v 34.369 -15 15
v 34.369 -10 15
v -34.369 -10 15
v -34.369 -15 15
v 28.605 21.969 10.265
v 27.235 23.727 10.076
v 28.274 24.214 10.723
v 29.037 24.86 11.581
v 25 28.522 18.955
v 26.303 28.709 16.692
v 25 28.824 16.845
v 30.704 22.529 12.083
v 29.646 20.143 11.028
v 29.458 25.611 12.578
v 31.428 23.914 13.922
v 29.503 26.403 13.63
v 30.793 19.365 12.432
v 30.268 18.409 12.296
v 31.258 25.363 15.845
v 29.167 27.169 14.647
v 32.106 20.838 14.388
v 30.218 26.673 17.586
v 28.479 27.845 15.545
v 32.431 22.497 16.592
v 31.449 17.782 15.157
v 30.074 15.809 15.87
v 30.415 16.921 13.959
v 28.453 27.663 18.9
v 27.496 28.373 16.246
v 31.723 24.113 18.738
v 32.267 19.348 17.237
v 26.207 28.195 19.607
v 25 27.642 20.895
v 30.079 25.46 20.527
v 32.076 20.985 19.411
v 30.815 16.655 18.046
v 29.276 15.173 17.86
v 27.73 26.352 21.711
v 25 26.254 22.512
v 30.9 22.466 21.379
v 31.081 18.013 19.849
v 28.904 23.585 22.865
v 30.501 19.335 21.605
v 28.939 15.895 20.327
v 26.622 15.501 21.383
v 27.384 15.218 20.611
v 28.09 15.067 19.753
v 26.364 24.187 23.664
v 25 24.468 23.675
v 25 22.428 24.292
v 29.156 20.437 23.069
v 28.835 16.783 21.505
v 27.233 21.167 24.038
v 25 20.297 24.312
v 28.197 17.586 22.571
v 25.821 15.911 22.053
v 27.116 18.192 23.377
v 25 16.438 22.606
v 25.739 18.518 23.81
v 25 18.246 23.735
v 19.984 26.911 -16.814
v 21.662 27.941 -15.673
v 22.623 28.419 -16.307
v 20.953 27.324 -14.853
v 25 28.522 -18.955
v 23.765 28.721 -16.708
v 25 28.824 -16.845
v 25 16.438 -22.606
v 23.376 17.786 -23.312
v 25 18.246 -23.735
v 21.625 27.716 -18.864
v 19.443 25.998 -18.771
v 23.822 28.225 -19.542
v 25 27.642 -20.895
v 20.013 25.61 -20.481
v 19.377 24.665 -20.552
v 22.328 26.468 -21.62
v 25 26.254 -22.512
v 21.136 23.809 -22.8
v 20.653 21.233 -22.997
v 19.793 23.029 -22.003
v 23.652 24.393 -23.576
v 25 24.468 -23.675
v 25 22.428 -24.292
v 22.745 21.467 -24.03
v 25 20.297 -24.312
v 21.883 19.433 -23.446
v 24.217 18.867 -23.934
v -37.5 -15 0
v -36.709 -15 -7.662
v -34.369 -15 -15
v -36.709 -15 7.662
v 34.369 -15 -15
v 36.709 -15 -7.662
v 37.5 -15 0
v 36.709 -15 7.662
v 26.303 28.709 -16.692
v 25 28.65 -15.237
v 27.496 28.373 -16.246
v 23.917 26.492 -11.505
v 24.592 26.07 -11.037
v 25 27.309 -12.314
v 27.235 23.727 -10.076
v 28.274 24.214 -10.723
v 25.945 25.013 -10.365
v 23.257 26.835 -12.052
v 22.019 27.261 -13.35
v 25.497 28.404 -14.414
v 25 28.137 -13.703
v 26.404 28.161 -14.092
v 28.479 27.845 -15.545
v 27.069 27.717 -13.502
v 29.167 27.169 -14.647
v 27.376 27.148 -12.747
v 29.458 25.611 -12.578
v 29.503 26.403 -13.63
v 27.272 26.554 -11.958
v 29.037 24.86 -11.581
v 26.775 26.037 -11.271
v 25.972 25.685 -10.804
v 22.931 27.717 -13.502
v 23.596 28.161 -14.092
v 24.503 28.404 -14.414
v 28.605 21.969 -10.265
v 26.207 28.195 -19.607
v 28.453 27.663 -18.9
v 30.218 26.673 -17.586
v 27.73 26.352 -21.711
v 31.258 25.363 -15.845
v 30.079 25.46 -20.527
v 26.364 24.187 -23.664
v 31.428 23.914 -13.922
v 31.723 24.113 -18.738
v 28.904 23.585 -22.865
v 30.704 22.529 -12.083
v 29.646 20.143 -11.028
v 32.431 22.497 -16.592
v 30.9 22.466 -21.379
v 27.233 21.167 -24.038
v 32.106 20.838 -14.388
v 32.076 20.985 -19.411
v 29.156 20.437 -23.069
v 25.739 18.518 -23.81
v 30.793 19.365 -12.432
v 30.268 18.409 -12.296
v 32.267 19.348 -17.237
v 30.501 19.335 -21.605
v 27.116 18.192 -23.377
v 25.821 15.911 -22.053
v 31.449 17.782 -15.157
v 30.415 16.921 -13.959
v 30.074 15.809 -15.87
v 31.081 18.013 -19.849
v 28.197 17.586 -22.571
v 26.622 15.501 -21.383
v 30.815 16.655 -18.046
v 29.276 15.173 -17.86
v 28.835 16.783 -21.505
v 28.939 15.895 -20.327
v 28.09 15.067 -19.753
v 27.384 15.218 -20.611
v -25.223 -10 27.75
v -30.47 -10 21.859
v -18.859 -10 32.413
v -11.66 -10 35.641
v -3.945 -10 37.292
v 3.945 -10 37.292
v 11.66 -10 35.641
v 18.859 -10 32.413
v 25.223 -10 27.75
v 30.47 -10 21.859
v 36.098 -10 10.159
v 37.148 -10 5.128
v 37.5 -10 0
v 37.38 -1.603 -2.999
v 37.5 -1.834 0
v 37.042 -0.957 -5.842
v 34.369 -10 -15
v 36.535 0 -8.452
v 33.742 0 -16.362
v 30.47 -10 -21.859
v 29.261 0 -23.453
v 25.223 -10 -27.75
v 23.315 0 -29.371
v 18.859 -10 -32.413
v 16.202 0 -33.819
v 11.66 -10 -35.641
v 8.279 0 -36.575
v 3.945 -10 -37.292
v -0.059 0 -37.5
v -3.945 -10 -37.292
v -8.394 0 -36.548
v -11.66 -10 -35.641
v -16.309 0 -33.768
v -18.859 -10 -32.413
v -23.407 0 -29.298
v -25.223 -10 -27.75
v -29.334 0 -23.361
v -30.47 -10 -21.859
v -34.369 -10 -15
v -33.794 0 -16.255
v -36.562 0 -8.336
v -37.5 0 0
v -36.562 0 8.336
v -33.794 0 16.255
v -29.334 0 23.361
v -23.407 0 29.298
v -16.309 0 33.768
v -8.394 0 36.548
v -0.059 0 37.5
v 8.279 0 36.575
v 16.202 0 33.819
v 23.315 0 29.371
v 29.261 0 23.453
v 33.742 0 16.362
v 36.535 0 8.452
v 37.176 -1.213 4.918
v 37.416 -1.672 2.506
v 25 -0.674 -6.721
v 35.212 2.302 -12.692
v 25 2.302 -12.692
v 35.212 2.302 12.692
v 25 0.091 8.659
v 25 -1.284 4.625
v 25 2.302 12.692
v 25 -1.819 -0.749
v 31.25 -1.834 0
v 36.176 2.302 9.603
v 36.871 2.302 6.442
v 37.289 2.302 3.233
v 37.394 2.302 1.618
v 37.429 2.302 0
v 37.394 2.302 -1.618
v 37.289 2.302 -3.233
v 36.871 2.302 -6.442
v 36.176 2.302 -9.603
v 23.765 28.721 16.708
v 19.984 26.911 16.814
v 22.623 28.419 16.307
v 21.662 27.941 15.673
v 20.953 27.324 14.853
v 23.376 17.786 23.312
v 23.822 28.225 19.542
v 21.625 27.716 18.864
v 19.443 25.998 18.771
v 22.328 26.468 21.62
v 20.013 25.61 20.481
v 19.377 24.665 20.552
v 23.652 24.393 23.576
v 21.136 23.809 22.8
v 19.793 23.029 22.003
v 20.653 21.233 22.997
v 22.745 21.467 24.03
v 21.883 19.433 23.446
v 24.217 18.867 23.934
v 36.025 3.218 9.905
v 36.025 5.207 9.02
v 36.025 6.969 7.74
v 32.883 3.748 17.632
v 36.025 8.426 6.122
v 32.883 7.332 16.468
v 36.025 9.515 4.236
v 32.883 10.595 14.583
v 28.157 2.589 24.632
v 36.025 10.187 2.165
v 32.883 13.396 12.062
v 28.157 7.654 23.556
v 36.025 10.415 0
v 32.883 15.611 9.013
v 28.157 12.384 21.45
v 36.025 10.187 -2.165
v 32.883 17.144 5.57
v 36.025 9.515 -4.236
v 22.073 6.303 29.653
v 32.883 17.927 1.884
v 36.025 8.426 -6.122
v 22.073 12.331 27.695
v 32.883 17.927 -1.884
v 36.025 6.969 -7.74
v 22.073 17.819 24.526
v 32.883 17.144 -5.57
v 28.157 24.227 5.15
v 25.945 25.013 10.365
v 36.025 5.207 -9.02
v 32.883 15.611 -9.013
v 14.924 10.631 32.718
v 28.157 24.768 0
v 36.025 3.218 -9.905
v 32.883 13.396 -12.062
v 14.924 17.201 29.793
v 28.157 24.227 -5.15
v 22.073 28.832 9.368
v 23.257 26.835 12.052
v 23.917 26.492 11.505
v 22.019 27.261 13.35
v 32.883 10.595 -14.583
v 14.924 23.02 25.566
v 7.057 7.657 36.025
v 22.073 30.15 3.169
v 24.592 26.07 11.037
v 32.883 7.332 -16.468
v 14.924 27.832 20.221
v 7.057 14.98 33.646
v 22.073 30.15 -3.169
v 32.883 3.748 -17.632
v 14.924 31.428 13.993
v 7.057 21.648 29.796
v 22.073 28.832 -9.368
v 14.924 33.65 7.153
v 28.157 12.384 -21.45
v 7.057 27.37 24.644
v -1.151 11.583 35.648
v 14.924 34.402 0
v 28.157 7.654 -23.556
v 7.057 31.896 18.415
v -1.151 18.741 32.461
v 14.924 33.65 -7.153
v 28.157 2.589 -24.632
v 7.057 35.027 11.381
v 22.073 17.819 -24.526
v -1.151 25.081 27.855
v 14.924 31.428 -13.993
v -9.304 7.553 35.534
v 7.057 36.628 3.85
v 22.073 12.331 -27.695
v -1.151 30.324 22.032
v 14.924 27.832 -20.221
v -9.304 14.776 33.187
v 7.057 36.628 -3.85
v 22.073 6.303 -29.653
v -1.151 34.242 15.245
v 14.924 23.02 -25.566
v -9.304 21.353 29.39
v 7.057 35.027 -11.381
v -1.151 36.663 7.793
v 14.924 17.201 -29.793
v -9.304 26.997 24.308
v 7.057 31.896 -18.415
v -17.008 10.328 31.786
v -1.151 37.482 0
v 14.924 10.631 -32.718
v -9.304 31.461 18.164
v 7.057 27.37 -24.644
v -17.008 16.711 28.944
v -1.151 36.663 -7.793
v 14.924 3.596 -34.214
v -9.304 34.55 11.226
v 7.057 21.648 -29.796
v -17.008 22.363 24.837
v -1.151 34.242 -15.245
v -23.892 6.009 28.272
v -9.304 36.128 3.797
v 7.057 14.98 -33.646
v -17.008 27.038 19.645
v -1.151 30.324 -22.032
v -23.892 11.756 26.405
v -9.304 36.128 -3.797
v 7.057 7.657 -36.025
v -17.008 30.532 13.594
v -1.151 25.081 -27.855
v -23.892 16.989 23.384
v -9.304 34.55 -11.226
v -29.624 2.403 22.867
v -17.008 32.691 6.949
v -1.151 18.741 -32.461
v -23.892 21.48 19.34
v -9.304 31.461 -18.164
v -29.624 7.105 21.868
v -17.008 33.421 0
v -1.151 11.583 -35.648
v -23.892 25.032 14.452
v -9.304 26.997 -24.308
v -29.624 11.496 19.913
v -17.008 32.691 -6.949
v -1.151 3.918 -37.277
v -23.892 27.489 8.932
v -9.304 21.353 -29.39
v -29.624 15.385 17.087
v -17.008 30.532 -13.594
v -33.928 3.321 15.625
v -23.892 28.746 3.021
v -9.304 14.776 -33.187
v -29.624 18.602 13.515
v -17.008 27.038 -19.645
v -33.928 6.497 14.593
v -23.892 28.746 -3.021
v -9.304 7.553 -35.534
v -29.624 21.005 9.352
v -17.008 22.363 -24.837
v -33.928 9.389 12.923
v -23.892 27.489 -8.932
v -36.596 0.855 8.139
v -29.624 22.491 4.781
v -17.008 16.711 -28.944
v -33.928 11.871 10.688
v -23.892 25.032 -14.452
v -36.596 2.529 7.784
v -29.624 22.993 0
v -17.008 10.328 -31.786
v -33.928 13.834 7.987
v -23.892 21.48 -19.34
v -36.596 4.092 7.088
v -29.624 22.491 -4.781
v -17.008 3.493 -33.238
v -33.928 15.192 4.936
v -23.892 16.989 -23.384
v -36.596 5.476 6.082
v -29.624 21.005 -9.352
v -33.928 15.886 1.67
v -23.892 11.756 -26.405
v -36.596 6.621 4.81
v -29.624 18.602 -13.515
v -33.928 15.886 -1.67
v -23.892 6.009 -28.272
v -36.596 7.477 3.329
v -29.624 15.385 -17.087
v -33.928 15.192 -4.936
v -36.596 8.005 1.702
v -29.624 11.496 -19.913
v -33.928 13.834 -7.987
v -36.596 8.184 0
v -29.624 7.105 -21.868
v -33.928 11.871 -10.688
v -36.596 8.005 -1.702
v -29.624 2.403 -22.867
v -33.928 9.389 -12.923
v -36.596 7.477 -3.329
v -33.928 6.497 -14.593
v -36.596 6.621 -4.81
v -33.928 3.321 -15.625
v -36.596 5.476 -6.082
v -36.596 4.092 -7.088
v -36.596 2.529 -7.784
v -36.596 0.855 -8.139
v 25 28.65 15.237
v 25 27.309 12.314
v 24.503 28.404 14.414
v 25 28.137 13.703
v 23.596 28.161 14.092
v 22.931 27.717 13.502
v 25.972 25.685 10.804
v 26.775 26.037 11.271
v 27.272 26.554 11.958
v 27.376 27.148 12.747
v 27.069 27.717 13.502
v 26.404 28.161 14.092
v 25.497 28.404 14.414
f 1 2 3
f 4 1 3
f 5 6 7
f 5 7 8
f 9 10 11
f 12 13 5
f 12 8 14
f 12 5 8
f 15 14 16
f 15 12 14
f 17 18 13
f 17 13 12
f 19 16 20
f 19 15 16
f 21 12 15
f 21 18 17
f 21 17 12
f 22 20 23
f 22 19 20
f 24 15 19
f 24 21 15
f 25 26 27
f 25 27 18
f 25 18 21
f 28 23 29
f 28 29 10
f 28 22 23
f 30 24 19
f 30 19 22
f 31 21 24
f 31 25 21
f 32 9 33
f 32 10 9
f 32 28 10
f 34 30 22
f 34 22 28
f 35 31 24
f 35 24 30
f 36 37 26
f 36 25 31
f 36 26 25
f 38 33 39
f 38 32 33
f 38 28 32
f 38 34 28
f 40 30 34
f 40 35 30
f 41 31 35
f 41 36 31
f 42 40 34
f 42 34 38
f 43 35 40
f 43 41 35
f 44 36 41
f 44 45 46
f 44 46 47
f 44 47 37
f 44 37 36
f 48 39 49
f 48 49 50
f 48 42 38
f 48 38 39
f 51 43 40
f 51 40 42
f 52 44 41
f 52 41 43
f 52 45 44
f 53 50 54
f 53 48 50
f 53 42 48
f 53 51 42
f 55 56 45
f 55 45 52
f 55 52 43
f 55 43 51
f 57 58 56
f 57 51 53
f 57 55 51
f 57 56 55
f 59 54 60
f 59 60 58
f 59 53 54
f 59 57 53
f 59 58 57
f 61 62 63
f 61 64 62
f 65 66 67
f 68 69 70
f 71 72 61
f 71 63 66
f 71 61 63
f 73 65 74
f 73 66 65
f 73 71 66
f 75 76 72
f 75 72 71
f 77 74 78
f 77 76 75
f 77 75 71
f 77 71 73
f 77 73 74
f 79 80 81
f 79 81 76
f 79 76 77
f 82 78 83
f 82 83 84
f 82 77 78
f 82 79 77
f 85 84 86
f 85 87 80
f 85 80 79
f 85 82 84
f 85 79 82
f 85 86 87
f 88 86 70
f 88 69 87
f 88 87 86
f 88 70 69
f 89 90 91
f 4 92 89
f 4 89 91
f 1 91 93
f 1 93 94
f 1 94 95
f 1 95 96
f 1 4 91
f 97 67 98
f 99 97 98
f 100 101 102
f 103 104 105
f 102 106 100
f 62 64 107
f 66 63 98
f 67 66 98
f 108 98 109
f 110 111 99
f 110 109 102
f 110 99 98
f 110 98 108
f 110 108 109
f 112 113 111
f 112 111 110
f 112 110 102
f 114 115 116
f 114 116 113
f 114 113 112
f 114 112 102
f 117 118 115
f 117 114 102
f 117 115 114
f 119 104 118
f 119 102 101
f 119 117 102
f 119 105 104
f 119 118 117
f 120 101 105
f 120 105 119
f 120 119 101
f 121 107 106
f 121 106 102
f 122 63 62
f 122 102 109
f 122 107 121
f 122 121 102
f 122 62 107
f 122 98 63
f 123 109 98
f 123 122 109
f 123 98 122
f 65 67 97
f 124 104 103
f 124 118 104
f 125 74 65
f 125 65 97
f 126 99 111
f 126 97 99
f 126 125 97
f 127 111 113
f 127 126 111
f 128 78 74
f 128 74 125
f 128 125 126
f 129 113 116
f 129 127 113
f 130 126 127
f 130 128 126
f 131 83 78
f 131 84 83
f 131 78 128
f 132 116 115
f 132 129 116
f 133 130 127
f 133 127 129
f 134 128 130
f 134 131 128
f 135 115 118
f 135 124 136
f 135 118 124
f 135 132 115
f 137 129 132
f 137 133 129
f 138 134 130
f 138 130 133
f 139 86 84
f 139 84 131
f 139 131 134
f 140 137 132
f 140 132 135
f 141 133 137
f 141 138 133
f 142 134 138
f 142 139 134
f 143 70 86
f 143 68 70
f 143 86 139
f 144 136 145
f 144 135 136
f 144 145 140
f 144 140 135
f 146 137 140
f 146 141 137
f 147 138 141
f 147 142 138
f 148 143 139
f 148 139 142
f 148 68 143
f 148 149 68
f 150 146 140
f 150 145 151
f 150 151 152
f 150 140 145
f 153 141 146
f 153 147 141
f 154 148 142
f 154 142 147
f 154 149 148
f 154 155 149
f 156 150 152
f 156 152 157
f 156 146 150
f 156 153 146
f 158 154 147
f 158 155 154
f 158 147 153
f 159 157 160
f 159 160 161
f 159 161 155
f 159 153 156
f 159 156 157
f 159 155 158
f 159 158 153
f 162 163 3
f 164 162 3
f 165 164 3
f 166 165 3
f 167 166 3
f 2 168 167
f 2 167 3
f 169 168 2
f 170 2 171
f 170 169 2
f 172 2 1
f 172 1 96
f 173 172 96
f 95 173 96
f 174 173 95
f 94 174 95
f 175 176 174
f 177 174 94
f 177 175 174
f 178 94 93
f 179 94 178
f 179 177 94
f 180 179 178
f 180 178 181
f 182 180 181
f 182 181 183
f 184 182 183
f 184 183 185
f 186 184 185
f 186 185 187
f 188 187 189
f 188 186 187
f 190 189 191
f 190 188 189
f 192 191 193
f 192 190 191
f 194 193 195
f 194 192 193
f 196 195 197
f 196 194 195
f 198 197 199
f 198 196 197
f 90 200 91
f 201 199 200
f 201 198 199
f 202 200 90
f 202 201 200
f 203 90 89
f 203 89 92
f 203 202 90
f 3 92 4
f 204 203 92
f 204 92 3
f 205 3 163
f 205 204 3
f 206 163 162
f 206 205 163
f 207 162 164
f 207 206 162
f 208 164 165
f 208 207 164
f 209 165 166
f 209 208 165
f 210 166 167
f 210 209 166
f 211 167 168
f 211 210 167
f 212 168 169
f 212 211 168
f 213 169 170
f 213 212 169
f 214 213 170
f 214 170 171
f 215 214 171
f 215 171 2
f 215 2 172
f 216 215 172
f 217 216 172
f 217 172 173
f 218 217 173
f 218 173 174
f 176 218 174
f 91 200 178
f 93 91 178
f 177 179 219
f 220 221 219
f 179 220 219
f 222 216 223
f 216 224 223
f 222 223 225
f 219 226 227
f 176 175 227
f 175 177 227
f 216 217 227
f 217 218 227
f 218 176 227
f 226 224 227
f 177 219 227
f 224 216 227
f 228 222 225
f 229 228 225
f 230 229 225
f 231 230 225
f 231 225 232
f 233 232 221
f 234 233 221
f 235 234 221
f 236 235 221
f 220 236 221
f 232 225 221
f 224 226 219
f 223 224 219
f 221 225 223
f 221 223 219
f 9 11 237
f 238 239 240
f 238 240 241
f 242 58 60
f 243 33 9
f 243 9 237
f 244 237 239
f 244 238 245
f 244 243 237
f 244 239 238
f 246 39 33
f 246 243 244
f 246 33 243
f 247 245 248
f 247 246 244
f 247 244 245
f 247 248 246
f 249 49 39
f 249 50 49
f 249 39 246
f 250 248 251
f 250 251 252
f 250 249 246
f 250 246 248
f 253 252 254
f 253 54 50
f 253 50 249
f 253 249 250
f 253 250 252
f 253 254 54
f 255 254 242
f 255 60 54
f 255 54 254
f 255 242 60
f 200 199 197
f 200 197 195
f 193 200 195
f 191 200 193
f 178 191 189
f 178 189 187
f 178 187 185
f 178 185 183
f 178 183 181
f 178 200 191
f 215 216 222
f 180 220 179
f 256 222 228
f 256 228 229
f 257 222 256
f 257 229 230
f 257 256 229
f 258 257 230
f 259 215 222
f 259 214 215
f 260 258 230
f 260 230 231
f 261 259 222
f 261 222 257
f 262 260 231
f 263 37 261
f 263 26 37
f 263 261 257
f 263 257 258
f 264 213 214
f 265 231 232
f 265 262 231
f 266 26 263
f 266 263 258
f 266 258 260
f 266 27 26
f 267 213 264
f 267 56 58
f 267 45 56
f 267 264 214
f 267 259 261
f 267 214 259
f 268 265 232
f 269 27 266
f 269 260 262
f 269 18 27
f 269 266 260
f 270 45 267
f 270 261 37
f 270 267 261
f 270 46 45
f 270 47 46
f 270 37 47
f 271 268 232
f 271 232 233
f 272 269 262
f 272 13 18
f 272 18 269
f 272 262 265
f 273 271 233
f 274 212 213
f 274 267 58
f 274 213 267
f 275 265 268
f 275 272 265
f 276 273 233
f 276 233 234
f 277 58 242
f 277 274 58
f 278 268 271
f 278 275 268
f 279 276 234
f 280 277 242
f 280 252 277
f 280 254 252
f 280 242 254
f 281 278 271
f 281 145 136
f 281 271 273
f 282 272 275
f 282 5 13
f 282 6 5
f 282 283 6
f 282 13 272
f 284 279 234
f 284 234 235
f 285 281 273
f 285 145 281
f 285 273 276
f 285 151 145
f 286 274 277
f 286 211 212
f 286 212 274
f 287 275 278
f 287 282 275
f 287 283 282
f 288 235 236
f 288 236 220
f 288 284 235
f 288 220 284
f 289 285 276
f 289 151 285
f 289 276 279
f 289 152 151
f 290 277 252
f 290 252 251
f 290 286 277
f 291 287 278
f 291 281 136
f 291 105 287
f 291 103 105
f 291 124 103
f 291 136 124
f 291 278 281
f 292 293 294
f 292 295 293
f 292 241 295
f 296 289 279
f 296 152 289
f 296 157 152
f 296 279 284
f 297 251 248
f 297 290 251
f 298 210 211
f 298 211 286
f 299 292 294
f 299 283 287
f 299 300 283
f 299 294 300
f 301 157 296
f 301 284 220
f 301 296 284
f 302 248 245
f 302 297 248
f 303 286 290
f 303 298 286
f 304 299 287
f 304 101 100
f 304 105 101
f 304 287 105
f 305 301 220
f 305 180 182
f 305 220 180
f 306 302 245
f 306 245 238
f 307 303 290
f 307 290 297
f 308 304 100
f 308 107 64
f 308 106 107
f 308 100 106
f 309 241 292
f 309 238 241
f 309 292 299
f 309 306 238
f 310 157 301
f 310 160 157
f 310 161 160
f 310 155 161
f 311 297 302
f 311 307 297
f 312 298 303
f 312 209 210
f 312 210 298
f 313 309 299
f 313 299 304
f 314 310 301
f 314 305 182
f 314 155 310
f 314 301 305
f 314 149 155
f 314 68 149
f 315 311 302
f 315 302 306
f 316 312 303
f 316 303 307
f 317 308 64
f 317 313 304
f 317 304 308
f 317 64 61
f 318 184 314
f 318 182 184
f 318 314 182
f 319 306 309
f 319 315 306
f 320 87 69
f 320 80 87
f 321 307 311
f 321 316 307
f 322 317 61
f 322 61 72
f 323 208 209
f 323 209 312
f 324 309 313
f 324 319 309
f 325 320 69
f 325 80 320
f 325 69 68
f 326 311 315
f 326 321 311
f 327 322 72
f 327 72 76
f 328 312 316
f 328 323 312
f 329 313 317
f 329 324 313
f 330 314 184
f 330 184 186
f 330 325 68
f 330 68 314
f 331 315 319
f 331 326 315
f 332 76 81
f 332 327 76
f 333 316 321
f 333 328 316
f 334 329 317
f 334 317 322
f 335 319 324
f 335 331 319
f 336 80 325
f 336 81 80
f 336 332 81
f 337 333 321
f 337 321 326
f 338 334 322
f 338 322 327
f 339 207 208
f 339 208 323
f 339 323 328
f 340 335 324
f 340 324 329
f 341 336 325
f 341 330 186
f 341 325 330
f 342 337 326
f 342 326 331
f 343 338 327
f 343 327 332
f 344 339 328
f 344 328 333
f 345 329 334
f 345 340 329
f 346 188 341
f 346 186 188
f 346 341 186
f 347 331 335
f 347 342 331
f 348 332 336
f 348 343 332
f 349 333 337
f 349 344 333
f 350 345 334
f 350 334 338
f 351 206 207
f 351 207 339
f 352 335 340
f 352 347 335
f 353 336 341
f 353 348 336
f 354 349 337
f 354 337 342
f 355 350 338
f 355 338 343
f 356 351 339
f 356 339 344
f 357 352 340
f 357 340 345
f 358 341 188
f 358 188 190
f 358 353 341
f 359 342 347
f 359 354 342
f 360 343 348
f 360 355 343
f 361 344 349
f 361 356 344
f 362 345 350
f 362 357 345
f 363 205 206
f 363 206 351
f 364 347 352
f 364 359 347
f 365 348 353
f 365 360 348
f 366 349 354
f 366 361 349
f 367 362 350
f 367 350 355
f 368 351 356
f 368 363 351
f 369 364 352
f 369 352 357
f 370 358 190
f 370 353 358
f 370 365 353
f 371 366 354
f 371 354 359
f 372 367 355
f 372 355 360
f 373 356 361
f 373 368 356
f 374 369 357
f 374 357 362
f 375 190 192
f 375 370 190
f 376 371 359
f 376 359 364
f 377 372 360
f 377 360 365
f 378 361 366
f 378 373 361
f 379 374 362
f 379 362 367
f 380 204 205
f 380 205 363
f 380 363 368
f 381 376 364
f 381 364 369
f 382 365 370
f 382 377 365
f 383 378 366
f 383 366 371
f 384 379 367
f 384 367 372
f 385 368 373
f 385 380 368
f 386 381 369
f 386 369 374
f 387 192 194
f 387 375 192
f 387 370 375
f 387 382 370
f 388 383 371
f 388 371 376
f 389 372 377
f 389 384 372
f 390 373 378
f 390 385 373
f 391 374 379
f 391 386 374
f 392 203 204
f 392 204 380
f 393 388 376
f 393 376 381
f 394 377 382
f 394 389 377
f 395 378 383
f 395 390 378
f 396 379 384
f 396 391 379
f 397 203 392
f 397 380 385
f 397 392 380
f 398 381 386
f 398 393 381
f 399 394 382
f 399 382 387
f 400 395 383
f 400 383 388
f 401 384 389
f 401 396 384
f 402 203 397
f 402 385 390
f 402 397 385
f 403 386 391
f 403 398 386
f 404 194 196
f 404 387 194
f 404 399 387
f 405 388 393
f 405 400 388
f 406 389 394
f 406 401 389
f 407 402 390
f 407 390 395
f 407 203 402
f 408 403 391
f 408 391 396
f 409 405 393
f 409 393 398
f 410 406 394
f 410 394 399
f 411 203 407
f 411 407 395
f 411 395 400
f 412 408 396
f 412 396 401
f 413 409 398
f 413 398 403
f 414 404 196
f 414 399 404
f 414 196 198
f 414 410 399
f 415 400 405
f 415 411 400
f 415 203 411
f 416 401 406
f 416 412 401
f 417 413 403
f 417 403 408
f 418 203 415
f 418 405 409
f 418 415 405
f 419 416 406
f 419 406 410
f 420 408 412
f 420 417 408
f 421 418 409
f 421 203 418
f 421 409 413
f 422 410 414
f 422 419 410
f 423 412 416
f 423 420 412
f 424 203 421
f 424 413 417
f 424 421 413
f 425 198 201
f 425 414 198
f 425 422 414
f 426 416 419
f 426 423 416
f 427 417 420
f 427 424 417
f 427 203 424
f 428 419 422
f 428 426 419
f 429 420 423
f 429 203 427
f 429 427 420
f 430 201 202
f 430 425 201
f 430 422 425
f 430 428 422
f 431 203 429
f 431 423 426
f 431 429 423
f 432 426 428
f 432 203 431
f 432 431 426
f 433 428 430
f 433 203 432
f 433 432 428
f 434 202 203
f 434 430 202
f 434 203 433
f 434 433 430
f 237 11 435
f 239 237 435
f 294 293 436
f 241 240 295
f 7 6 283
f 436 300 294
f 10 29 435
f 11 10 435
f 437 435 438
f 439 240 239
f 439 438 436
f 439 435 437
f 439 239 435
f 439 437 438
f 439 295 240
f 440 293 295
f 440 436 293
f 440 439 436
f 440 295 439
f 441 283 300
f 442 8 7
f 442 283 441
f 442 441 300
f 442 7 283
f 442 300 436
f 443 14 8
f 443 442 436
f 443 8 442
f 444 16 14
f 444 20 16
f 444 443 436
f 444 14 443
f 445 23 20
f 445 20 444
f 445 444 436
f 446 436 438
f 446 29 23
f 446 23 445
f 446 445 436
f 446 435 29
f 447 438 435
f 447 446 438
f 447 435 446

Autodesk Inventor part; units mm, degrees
ref_plane "XZ Plane" through (0, 0, 0) normal (0, 1, 0) x (-1, 0, 0)
ref_plane "XY Plane" through (0, 0, 0) normal (0, 0, 1) x (1, 0, 0)
sketch "Esquisse1" plane through (0, 0, 0) normal (0, 1, 0) x (-1, 0, 0)
  circle A0 centre (0, 0) radius 37.5
  line L0 (37.5, 0) -> (-37.5, 0)
  dimension "d0" = 75
revolve "Révolution1" add sketch "Esquisse1" angle 180 about axis through (-37.5, 0, 0) along (1, 0, 0) picked at (1.2379, -17.9235) contours A0 L0
sketch "Esquisse3" plane through (0, 0, 0) normal (0, -1, 0) x (1, 0, 0)
  circle A0 centre (0, 0) radius 37.5 projected
extrude "Extrusion2" add sketch "Esquisse3" along normal blind 10
sketch "Esquisse4" plane through (0, -10, 0) normal (0, -1, 0) x (1, 0, 0)
  circle A0 centre (0, 0) radius 37.5 projected
  line L0 (-52.5, 0) -> (52.5, 0) projected
  line L1 (34.3693, 15) -> (-34.3693, 15)
  line L2 (-34.3693, -15) -> (34.3693, -15)
  dimension "d8" = 15
  dimension "d9" = 15
extrude "Extrusion3" add sketch "Esquisse4" along normal blind 5 contours L0 A0 L1 | A0 L2 L0
ref_plane "Plan de construction1" through (25, 0, 0) normal (1, 0, 0) x (0, 1, 0)
sketch "Esquisse6" plane through (25, 0, 0) normal (1, 0, 0) x (0, 1, 0)
  line L0 (0, 37.5) -> (0, -37.5) projected
  circle A0 centre (21.2908, 16.8449) radius 7.533
  line L1 (27.3087, 12.3138) -> (15.2729, 21.376)
  line L2 (0, 0) -> (47.2705, 0) construction
ref_plane "Plan de construction2" through (34.3693, -10, 0) normal (0, 0, -1) x (-1, 0, 0)
revolve "Révolution2" add sketch "Esquisse6" angle 360 about axis through (25, 27.3087, 12.3138) along (0, -0.7988722, 0.6015008) picked at (22.6507, 18.9558) contours A0 L1
mirror "Symétrie1" about plane through (34.3693, -10, 0) normal (0, 0, -1) of "Révolution2"
sketch "Esquisse8" plane through (25, 0, 0) normal (1, 0, 0) x (0, 1, 0)
  line L0 (-10, -15) -> (-10, -15) construction
  line L1 (-10, -15) -> (-15, -15) construction
  line L2 (-15, 15) -> (-15, -15) construction
  line L3 (-10, 15) -> (-15, 15) construction
  line L4 (-10, 15) -> (-10, 15) construction
  line L5 (-10, 15) -> (-15, 15) construction
  line L6 (-15, -15) -> (-15, 15) construction
  line L7 (-10, -15) -> (-15, -15) construction
  line L8 (0, 37.5) -> (0, -37.5) construction
  line L9 (-15, 15) -> (-15, -15) construction
  line L10 (-15, 0) -> (31.9456, 0) construction
  line L11 (2.3018, 12.6924) -> (2.3018, -12.6924)
  line L12 (2.3018, -12.6924) -> (-5.9689, 0) construction
  line L13 (-5.9689, 0) -> (2.3018, 12.6924) construction
  spline S0 degree 2 poles (2.3018, -12.6924) (-5.9689, 0) (2.3018, 12.6924) knots 1 1 1 2 2 2
  line L14 (2.3018, 0) -> (-5.9689, 0) construction
  point P0 (0, 0)
extrude "Extrusion5" cut sketch "Esquisse8" along normal through all
equation "\"d9\" = d8"
properties part number "head3"
